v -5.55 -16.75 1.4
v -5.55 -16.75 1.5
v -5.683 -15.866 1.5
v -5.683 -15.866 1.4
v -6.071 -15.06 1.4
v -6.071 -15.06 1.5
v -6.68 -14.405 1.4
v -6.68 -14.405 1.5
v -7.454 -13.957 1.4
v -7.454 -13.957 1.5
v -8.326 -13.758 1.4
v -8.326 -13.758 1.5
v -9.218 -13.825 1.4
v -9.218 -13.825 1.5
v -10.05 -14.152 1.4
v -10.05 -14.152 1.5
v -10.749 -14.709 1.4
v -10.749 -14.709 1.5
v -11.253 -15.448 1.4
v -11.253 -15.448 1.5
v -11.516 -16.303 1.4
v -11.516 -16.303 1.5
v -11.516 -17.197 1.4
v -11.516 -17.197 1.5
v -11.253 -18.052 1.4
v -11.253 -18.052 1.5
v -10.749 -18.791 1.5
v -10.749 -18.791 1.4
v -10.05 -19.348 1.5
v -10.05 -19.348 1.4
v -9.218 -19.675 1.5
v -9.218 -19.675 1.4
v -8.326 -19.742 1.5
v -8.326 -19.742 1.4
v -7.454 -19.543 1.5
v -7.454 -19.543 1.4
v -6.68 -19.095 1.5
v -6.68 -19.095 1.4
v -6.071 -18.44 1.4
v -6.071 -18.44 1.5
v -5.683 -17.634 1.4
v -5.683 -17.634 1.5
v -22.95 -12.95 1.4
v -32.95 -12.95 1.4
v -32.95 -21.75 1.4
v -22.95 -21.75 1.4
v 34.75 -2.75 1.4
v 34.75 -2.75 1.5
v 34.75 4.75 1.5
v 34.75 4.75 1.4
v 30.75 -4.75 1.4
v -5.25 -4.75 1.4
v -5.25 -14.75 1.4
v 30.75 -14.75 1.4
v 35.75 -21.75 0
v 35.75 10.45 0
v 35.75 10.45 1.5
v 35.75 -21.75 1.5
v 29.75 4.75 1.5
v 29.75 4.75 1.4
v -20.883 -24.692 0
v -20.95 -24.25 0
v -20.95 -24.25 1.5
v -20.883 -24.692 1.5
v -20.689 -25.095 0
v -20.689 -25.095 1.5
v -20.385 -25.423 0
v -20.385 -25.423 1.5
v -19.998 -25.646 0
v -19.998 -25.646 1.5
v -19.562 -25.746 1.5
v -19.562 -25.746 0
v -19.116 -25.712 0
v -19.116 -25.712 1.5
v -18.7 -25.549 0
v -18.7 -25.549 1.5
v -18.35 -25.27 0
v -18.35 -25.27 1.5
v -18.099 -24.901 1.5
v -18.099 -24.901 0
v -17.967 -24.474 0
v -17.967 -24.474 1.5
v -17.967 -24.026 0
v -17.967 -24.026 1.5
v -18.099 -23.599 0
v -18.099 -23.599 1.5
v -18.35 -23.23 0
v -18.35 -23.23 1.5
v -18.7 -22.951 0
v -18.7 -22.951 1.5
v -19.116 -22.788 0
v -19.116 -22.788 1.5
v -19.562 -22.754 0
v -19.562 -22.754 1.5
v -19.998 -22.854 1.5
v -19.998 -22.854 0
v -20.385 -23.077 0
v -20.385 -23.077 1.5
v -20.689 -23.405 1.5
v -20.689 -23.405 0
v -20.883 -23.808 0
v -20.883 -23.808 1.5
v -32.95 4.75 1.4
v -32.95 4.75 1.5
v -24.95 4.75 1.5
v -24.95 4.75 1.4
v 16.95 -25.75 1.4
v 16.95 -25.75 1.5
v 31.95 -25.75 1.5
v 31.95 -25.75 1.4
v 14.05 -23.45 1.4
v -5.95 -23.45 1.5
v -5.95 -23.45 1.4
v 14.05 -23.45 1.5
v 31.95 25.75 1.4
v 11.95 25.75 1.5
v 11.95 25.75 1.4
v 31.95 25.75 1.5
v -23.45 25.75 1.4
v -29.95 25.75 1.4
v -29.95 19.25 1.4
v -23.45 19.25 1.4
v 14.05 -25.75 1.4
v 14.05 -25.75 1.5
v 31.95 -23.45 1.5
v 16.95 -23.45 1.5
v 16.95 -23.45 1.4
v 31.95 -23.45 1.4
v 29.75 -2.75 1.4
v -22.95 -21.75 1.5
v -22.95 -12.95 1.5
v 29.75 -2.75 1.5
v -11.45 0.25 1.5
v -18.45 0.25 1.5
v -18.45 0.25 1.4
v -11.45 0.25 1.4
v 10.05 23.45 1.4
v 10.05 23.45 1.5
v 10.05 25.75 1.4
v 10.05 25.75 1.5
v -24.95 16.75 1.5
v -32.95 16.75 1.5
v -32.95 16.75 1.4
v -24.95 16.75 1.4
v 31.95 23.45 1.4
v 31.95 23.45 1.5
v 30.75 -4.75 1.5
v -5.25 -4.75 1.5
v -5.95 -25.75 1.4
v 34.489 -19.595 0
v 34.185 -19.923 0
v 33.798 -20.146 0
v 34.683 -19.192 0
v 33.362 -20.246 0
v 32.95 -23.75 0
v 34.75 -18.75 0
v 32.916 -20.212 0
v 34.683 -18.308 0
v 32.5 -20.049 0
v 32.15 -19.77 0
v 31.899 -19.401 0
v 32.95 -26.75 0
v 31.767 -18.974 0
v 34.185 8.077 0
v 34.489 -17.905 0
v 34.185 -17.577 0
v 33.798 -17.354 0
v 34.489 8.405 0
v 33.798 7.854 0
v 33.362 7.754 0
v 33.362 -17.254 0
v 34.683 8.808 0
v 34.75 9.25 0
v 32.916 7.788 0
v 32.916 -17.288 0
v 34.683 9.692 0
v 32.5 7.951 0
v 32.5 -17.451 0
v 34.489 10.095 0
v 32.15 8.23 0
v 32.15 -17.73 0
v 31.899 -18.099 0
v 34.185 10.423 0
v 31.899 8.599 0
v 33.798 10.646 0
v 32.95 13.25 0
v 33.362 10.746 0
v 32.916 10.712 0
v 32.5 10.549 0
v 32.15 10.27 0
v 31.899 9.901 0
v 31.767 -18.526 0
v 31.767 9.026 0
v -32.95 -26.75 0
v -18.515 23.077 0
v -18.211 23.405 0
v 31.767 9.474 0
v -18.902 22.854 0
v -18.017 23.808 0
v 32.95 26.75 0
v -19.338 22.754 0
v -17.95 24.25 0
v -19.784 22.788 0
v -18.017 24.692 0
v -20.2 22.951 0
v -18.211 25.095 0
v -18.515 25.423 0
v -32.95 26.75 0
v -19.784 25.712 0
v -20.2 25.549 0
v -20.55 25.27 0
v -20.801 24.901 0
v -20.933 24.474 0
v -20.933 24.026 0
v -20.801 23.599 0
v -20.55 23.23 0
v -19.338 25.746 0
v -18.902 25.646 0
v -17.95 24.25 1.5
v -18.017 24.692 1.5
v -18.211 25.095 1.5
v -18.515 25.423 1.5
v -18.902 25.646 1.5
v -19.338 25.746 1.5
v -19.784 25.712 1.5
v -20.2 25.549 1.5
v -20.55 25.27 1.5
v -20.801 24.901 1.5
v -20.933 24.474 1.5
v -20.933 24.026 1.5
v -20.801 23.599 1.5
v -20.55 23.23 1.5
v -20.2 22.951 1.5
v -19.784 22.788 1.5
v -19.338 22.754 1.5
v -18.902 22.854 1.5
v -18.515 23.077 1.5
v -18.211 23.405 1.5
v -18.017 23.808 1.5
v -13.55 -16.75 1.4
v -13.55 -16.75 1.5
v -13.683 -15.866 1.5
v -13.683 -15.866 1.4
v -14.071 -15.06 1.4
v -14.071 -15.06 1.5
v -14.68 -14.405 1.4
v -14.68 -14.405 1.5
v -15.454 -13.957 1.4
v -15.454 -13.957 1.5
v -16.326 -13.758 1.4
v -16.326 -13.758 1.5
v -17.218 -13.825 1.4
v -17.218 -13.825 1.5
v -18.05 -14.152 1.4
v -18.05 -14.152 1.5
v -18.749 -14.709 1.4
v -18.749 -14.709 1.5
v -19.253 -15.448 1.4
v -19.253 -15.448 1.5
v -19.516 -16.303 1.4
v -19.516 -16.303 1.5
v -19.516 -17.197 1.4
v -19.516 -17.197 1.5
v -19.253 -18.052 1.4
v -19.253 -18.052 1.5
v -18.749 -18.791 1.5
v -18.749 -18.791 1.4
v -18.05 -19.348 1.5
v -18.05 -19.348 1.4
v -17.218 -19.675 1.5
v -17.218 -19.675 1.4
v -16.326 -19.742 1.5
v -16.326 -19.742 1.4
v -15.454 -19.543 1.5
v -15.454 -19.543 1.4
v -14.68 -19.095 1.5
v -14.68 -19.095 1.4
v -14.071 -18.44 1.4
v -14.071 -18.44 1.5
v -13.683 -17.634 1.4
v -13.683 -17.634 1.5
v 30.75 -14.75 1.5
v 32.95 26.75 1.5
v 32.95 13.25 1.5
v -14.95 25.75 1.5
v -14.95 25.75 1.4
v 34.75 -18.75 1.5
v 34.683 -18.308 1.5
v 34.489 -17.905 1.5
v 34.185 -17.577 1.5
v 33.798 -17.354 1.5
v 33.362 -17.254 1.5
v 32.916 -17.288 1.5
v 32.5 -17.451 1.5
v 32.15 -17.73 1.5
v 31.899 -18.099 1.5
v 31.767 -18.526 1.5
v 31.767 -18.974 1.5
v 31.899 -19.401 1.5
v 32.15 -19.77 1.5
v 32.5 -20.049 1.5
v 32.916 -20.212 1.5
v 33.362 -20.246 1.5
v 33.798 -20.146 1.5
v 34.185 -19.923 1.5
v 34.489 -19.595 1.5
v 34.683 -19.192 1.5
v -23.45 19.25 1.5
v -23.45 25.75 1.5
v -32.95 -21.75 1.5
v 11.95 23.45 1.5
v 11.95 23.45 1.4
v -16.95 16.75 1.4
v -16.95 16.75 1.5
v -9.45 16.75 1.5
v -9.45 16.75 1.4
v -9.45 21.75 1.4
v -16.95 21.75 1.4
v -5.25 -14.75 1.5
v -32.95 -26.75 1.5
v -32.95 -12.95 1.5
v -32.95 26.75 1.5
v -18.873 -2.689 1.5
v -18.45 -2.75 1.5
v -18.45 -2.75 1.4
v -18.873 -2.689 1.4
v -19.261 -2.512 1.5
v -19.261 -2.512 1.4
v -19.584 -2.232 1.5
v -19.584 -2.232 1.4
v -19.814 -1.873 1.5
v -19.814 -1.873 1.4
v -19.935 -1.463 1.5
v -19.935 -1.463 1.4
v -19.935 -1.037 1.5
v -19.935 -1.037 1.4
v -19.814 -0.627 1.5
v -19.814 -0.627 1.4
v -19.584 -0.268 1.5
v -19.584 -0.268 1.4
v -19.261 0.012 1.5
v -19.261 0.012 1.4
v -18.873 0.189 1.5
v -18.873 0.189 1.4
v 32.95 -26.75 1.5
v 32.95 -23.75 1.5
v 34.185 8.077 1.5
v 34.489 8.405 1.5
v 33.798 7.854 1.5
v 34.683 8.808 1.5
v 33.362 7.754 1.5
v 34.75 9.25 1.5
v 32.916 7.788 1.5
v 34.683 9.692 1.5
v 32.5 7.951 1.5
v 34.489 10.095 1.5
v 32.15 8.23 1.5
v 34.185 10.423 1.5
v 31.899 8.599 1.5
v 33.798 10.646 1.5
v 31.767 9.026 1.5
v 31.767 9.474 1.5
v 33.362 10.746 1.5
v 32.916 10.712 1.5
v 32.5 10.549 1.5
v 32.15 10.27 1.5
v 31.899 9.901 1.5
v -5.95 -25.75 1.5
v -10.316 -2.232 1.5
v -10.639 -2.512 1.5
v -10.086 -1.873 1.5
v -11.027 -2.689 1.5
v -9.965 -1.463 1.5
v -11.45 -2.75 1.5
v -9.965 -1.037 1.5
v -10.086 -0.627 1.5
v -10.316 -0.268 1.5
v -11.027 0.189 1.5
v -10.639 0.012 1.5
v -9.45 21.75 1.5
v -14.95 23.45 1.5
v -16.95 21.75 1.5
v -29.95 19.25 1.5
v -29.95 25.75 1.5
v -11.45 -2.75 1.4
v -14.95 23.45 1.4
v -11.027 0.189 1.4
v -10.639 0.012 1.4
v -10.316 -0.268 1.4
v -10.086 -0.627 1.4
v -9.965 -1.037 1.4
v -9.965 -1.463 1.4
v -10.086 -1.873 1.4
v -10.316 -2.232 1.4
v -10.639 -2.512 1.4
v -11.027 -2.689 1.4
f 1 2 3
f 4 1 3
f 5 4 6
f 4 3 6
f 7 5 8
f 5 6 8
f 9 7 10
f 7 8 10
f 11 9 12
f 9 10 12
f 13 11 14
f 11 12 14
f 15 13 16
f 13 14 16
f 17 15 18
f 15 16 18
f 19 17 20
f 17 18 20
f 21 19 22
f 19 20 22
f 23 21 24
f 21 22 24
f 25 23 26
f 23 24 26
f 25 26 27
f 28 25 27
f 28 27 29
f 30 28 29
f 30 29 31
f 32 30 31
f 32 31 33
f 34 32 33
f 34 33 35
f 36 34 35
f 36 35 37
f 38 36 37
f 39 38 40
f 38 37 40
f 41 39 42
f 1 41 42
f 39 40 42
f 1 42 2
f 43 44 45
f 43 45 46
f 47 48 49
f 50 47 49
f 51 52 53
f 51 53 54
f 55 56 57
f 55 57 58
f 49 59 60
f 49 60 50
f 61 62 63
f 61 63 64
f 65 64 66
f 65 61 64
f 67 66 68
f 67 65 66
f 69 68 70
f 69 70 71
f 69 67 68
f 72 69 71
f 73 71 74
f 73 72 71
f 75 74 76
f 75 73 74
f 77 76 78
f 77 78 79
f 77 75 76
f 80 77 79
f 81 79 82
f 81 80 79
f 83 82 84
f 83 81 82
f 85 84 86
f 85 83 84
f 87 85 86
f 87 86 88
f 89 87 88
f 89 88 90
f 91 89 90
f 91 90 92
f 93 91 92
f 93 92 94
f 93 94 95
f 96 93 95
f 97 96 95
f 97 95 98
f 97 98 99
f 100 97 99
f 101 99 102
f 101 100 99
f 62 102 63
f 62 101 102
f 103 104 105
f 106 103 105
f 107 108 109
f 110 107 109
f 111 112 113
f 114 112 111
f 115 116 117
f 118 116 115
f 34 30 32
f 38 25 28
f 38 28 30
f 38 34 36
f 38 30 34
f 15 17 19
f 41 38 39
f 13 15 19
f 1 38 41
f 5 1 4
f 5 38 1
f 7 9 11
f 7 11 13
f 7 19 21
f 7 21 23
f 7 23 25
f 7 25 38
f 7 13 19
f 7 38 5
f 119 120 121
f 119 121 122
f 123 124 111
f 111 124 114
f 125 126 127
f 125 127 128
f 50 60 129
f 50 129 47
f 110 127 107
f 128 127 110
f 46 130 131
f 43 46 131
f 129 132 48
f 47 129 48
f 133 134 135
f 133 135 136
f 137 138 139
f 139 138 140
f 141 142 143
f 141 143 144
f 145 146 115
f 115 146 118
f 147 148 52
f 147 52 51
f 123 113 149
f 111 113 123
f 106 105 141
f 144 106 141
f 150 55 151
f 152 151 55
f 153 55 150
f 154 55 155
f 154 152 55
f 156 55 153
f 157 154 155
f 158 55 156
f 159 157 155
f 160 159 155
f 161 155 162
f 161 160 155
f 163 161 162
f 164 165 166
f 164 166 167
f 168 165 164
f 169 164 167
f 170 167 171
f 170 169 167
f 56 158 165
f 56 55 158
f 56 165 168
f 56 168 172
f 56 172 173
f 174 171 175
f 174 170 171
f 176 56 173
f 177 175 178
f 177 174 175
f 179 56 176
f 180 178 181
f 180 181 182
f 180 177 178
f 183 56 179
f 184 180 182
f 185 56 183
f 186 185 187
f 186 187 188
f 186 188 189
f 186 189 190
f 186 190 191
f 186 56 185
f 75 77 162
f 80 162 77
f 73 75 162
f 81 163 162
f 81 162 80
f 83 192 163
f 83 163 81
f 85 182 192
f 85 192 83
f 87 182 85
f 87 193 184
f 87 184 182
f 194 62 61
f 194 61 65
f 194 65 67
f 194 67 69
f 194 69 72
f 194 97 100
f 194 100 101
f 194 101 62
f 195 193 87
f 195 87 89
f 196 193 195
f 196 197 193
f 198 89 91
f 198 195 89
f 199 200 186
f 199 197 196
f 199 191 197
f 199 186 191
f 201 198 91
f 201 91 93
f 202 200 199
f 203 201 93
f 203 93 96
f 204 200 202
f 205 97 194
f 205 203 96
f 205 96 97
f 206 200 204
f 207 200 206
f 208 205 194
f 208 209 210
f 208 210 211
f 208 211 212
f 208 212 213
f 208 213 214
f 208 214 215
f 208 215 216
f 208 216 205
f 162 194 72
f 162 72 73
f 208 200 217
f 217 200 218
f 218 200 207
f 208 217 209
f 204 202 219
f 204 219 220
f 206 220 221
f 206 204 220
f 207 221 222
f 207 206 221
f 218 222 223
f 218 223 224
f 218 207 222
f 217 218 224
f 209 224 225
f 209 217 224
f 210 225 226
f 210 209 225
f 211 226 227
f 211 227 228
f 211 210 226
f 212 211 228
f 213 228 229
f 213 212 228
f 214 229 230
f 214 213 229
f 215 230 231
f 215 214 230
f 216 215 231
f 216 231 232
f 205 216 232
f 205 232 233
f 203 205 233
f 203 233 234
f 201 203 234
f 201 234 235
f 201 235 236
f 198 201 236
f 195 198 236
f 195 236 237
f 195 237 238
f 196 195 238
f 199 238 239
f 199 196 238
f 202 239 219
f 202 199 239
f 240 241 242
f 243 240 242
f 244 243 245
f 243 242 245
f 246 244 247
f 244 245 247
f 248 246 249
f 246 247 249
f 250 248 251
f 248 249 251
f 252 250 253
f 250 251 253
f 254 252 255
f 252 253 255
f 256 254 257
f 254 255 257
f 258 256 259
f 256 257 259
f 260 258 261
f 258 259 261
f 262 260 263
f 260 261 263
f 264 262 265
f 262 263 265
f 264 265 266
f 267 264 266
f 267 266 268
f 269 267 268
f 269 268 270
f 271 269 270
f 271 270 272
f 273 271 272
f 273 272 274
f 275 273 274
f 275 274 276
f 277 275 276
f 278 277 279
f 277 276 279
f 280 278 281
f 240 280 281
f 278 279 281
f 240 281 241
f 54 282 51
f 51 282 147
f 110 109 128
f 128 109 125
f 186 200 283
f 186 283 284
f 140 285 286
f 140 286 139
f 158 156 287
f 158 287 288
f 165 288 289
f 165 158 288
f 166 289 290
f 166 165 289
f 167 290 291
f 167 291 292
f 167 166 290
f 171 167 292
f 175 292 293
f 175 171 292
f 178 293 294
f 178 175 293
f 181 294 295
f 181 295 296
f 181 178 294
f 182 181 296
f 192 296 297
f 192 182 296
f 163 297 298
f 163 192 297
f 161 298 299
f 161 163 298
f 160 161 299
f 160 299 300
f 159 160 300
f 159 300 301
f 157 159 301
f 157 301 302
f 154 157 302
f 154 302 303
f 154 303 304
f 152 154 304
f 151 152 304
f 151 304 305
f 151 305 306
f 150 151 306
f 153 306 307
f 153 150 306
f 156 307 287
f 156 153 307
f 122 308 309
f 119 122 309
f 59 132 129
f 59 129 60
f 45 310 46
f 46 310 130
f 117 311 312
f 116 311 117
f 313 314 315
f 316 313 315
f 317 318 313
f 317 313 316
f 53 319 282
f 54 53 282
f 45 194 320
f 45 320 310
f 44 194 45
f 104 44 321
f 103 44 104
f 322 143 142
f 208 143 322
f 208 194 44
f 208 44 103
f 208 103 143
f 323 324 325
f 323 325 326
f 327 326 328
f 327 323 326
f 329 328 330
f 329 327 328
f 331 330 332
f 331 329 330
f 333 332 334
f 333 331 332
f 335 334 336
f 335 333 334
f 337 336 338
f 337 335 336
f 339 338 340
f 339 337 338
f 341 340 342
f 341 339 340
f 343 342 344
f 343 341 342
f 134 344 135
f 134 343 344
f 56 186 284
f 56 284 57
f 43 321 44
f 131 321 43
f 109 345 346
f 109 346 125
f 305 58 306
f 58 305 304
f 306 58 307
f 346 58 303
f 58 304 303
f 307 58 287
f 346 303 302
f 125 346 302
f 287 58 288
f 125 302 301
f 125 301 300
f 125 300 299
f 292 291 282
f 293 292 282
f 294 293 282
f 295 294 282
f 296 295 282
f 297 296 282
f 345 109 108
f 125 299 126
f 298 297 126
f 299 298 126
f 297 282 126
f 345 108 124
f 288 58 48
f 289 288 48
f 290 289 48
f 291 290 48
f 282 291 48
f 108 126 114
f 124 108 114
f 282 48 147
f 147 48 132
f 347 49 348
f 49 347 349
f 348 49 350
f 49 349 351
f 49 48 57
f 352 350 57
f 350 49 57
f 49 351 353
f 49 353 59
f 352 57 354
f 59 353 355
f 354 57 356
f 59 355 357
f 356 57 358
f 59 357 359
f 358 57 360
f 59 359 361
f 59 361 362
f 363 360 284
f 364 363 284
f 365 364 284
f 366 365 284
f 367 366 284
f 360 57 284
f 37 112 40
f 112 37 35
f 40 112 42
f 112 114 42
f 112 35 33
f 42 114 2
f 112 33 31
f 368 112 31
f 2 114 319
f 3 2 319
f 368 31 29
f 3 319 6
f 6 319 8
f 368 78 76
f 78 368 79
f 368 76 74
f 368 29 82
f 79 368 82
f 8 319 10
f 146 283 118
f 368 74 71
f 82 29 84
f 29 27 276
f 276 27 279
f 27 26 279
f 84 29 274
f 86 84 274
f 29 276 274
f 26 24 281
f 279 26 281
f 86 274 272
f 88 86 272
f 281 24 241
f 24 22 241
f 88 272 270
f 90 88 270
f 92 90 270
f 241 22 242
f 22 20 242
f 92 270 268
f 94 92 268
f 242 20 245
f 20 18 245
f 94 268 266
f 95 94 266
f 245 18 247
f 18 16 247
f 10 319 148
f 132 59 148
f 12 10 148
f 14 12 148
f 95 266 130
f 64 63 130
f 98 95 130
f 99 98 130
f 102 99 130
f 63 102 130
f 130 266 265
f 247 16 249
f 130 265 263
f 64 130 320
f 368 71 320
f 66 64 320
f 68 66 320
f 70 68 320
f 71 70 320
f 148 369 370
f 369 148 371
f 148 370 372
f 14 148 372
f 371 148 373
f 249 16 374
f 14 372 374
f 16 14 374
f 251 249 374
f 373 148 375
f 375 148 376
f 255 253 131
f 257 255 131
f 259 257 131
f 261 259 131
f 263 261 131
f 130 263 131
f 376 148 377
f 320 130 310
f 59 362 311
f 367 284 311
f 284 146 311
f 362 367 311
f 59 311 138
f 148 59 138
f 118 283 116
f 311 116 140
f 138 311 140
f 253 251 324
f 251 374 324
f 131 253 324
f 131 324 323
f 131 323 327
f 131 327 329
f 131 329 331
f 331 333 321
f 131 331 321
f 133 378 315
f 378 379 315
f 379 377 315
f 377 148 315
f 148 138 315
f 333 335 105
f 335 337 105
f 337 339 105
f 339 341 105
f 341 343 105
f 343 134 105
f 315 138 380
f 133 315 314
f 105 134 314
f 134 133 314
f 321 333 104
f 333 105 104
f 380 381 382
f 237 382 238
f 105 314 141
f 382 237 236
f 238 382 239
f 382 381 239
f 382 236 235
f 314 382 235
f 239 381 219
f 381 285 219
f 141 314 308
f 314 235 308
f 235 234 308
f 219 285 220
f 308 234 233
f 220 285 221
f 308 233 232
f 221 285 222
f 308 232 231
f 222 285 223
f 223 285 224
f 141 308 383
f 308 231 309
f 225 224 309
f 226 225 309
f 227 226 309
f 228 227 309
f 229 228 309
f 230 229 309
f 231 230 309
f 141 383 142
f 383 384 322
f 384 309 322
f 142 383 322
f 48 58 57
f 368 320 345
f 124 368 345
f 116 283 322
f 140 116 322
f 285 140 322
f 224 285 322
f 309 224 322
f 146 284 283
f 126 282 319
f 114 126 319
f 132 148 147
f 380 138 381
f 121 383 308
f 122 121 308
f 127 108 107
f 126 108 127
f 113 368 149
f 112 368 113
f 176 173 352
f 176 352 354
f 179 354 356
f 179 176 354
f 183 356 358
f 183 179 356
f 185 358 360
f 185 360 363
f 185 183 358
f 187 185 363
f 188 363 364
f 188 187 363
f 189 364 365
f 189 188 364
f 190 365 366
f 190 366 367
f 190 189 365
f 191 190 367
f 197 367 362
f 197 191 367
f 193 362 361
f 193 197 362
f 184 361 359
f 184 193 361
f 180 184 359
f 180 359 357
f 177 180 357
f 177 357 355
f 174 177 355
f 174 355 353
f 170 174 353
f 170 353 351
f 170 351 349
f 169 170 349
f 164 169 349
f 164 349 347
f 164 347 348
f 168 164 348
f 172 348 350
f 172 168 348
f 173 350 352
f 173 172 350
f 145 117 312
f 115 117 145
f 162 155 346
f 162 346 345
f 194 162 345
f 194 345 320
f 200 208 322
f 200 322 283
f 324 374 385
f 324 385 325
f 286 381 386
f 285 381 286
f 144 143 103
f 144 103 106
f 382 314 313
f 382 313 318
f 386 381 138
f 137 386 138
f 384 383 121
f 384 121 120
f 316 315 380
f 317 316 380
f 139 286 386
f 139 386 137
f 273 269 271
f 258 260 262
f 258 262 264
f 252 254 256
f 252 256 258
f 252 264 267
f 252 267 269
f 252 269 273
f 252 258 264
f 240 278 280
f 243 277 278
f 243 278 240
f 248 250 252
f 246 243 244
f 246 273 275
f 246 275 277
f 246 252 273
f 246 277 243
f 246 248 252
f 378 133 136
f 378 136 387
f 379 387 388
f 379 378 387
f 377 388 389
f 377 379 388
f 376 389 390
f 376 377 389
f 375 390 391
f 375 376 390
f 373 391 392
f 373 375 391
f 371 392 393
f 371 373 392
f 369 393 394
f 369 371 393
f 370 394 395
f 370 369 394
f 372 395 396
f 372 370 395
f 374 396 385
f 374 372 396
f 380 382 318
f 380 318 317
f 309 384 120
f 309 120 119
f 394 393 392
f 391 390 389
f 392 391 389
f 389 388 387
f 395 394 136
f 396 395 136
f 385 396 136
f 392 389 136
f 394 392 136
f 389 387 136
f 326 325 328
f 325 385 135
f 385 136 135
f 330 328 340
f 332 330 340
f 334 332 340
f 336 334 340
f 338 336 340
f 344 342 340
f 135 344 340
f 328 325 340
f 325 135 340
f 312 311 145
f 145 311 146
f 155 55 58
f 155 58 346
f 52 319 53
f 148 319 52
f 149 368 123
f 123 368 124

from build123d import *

# Parameters (mm, degrees)
ESQUISSE1_R             = 1.5
BOSS_EXTRU_1_DEPTH      = 1.5
ESQUISSE2_R             = 3
ESQUISSE2_W             = 6.5
ESQUISSE2_H             = 6.5
ESQUISSE2_W_2           = 36
ESQUISSE2_H_2           = 10
ESQUISSE2_W_3           = 5
ESQUISSE2_H_3           = 7.5
ESQUISSE2_W_4           = 20
ESQUISSE2_H_4           = 2.3
ESQUISSE2_W_5           = 15
ESQUISSE2_W_6           = 10.797288279
ESQUISSE2_H_5           = 8.8
ESQUISSE2_W_7           = 11.916291933
ESQUISSE2_H_6           = 12
ESQUISSE2_W_8           = 25
ESQUISSE2_W_9           = 7.5
ESQUISSE2_H_7           = 5
ENL_V_MAT_EXTRU_1_DEPTH = 0.1


with BuildPart() as part:
    # Esquisse1 → Boss.-Extru.1 (new body)
    with BuildSketch(Plane.XY):
        Polygon((35.75, 10.45), (35.75, -21.75), (32.95, -23.75), (32.95, -26.75), (-32.95, -26.75), (-32.95, 26.75), (32.95, 26.75), (32.95, 13.25), align=None)
        with Locations((33.25, 9.25)):
            Circle(ESQUISSE1_R, mode=Mode.SUBTRACT)
        with Locations((33.25, -18.75)):
            Circle(ESQUISSE1_R, mode=Mode.SUBTRACT)
        with Locations((-19.45, 24.25)):
            Circle(ESQUISSE1_R, mode=Mode.SUBTRACT)
        with Locations(Location((-19.45, -24.25, 0), (0, 0, 180))):
            Circle(ESQUISSE1_R, mode=Mode.SUBTRACT)
    extrude(amount=BOSS_EXTRU_1_DEPTH)

    # Esquisse2 → Enlèv. mat.-Extru.1 (cut)
    with BuildSketch(Plane.XY.offset(1.5)):
        with Locations((-16.55, -16.75)):
            Circle(ESQUISSE2_R)
        with Locations((-8.55, -16.75)):
            Circle(ESQUISSE2_R)
        with Locations((-26.7, 22.5)):
            Rectangle(ESQUISSE2_W, ESQUISSE2_H)
        with BuildLine():
            Line((-18.45, 0.25), (-11.45, 0.25))
            ThreePointArc((-11.45, 0.25), (-9.95, -1.25), (-11.45, -2.75))
            Line((-11.45, -2.75), (-18.45, -2.75))
            ThreePointArc((-18.45, -2.75), (-19.95, -1.25), (-18.45, 0.25))
        make_face()
        with Locations((12.75, -9.75)):
            Rectangle(ESQUISSE2_W_2, ESQUISSE2_H_2)
        with Locations((32.25, 1)):
            Rectangle(ESQUISSE2_W_3, ESQUISSE2_H_3)
        with Locations((4.05, -24.6)):
            Rectangle(ESQUISSE2_W_4, ESQUISSE2_H_4)
        with Locations((24.45, -24.6)):
            Rectangle(ESQUISSE2_W_5, ESQUISSE2_H_4)
        with Locations((-28.34864414, -17.35)):
            Rectangle(ESQUISSE2_W_6, ESQUISSE2_H_5)
        with Locations((-30.908145967, 10.75)):
            Rectangle(ESQUISSE2_W_7, ESQUISSE2_H_6)
        with Locations((-2.45, 24.6)):
            Rectangle(ESQUISSE2_W_8, ESQUISSE2_H_4)
        with Locations((21.95, 24.6)):
            Rectangle(ESQUISSE2_W_4, ESQUISSE2_H_4)
        with Locations((-13.2, 19.25)):
            Rectangle(ESQUISSE2_W_9, ESQUISSE2_H_7)
    extrude(amount=-ENL_V_MAT_EXTRU_1_DEPTH, mode=Mode.SUBTRACT)


solid = part.part
